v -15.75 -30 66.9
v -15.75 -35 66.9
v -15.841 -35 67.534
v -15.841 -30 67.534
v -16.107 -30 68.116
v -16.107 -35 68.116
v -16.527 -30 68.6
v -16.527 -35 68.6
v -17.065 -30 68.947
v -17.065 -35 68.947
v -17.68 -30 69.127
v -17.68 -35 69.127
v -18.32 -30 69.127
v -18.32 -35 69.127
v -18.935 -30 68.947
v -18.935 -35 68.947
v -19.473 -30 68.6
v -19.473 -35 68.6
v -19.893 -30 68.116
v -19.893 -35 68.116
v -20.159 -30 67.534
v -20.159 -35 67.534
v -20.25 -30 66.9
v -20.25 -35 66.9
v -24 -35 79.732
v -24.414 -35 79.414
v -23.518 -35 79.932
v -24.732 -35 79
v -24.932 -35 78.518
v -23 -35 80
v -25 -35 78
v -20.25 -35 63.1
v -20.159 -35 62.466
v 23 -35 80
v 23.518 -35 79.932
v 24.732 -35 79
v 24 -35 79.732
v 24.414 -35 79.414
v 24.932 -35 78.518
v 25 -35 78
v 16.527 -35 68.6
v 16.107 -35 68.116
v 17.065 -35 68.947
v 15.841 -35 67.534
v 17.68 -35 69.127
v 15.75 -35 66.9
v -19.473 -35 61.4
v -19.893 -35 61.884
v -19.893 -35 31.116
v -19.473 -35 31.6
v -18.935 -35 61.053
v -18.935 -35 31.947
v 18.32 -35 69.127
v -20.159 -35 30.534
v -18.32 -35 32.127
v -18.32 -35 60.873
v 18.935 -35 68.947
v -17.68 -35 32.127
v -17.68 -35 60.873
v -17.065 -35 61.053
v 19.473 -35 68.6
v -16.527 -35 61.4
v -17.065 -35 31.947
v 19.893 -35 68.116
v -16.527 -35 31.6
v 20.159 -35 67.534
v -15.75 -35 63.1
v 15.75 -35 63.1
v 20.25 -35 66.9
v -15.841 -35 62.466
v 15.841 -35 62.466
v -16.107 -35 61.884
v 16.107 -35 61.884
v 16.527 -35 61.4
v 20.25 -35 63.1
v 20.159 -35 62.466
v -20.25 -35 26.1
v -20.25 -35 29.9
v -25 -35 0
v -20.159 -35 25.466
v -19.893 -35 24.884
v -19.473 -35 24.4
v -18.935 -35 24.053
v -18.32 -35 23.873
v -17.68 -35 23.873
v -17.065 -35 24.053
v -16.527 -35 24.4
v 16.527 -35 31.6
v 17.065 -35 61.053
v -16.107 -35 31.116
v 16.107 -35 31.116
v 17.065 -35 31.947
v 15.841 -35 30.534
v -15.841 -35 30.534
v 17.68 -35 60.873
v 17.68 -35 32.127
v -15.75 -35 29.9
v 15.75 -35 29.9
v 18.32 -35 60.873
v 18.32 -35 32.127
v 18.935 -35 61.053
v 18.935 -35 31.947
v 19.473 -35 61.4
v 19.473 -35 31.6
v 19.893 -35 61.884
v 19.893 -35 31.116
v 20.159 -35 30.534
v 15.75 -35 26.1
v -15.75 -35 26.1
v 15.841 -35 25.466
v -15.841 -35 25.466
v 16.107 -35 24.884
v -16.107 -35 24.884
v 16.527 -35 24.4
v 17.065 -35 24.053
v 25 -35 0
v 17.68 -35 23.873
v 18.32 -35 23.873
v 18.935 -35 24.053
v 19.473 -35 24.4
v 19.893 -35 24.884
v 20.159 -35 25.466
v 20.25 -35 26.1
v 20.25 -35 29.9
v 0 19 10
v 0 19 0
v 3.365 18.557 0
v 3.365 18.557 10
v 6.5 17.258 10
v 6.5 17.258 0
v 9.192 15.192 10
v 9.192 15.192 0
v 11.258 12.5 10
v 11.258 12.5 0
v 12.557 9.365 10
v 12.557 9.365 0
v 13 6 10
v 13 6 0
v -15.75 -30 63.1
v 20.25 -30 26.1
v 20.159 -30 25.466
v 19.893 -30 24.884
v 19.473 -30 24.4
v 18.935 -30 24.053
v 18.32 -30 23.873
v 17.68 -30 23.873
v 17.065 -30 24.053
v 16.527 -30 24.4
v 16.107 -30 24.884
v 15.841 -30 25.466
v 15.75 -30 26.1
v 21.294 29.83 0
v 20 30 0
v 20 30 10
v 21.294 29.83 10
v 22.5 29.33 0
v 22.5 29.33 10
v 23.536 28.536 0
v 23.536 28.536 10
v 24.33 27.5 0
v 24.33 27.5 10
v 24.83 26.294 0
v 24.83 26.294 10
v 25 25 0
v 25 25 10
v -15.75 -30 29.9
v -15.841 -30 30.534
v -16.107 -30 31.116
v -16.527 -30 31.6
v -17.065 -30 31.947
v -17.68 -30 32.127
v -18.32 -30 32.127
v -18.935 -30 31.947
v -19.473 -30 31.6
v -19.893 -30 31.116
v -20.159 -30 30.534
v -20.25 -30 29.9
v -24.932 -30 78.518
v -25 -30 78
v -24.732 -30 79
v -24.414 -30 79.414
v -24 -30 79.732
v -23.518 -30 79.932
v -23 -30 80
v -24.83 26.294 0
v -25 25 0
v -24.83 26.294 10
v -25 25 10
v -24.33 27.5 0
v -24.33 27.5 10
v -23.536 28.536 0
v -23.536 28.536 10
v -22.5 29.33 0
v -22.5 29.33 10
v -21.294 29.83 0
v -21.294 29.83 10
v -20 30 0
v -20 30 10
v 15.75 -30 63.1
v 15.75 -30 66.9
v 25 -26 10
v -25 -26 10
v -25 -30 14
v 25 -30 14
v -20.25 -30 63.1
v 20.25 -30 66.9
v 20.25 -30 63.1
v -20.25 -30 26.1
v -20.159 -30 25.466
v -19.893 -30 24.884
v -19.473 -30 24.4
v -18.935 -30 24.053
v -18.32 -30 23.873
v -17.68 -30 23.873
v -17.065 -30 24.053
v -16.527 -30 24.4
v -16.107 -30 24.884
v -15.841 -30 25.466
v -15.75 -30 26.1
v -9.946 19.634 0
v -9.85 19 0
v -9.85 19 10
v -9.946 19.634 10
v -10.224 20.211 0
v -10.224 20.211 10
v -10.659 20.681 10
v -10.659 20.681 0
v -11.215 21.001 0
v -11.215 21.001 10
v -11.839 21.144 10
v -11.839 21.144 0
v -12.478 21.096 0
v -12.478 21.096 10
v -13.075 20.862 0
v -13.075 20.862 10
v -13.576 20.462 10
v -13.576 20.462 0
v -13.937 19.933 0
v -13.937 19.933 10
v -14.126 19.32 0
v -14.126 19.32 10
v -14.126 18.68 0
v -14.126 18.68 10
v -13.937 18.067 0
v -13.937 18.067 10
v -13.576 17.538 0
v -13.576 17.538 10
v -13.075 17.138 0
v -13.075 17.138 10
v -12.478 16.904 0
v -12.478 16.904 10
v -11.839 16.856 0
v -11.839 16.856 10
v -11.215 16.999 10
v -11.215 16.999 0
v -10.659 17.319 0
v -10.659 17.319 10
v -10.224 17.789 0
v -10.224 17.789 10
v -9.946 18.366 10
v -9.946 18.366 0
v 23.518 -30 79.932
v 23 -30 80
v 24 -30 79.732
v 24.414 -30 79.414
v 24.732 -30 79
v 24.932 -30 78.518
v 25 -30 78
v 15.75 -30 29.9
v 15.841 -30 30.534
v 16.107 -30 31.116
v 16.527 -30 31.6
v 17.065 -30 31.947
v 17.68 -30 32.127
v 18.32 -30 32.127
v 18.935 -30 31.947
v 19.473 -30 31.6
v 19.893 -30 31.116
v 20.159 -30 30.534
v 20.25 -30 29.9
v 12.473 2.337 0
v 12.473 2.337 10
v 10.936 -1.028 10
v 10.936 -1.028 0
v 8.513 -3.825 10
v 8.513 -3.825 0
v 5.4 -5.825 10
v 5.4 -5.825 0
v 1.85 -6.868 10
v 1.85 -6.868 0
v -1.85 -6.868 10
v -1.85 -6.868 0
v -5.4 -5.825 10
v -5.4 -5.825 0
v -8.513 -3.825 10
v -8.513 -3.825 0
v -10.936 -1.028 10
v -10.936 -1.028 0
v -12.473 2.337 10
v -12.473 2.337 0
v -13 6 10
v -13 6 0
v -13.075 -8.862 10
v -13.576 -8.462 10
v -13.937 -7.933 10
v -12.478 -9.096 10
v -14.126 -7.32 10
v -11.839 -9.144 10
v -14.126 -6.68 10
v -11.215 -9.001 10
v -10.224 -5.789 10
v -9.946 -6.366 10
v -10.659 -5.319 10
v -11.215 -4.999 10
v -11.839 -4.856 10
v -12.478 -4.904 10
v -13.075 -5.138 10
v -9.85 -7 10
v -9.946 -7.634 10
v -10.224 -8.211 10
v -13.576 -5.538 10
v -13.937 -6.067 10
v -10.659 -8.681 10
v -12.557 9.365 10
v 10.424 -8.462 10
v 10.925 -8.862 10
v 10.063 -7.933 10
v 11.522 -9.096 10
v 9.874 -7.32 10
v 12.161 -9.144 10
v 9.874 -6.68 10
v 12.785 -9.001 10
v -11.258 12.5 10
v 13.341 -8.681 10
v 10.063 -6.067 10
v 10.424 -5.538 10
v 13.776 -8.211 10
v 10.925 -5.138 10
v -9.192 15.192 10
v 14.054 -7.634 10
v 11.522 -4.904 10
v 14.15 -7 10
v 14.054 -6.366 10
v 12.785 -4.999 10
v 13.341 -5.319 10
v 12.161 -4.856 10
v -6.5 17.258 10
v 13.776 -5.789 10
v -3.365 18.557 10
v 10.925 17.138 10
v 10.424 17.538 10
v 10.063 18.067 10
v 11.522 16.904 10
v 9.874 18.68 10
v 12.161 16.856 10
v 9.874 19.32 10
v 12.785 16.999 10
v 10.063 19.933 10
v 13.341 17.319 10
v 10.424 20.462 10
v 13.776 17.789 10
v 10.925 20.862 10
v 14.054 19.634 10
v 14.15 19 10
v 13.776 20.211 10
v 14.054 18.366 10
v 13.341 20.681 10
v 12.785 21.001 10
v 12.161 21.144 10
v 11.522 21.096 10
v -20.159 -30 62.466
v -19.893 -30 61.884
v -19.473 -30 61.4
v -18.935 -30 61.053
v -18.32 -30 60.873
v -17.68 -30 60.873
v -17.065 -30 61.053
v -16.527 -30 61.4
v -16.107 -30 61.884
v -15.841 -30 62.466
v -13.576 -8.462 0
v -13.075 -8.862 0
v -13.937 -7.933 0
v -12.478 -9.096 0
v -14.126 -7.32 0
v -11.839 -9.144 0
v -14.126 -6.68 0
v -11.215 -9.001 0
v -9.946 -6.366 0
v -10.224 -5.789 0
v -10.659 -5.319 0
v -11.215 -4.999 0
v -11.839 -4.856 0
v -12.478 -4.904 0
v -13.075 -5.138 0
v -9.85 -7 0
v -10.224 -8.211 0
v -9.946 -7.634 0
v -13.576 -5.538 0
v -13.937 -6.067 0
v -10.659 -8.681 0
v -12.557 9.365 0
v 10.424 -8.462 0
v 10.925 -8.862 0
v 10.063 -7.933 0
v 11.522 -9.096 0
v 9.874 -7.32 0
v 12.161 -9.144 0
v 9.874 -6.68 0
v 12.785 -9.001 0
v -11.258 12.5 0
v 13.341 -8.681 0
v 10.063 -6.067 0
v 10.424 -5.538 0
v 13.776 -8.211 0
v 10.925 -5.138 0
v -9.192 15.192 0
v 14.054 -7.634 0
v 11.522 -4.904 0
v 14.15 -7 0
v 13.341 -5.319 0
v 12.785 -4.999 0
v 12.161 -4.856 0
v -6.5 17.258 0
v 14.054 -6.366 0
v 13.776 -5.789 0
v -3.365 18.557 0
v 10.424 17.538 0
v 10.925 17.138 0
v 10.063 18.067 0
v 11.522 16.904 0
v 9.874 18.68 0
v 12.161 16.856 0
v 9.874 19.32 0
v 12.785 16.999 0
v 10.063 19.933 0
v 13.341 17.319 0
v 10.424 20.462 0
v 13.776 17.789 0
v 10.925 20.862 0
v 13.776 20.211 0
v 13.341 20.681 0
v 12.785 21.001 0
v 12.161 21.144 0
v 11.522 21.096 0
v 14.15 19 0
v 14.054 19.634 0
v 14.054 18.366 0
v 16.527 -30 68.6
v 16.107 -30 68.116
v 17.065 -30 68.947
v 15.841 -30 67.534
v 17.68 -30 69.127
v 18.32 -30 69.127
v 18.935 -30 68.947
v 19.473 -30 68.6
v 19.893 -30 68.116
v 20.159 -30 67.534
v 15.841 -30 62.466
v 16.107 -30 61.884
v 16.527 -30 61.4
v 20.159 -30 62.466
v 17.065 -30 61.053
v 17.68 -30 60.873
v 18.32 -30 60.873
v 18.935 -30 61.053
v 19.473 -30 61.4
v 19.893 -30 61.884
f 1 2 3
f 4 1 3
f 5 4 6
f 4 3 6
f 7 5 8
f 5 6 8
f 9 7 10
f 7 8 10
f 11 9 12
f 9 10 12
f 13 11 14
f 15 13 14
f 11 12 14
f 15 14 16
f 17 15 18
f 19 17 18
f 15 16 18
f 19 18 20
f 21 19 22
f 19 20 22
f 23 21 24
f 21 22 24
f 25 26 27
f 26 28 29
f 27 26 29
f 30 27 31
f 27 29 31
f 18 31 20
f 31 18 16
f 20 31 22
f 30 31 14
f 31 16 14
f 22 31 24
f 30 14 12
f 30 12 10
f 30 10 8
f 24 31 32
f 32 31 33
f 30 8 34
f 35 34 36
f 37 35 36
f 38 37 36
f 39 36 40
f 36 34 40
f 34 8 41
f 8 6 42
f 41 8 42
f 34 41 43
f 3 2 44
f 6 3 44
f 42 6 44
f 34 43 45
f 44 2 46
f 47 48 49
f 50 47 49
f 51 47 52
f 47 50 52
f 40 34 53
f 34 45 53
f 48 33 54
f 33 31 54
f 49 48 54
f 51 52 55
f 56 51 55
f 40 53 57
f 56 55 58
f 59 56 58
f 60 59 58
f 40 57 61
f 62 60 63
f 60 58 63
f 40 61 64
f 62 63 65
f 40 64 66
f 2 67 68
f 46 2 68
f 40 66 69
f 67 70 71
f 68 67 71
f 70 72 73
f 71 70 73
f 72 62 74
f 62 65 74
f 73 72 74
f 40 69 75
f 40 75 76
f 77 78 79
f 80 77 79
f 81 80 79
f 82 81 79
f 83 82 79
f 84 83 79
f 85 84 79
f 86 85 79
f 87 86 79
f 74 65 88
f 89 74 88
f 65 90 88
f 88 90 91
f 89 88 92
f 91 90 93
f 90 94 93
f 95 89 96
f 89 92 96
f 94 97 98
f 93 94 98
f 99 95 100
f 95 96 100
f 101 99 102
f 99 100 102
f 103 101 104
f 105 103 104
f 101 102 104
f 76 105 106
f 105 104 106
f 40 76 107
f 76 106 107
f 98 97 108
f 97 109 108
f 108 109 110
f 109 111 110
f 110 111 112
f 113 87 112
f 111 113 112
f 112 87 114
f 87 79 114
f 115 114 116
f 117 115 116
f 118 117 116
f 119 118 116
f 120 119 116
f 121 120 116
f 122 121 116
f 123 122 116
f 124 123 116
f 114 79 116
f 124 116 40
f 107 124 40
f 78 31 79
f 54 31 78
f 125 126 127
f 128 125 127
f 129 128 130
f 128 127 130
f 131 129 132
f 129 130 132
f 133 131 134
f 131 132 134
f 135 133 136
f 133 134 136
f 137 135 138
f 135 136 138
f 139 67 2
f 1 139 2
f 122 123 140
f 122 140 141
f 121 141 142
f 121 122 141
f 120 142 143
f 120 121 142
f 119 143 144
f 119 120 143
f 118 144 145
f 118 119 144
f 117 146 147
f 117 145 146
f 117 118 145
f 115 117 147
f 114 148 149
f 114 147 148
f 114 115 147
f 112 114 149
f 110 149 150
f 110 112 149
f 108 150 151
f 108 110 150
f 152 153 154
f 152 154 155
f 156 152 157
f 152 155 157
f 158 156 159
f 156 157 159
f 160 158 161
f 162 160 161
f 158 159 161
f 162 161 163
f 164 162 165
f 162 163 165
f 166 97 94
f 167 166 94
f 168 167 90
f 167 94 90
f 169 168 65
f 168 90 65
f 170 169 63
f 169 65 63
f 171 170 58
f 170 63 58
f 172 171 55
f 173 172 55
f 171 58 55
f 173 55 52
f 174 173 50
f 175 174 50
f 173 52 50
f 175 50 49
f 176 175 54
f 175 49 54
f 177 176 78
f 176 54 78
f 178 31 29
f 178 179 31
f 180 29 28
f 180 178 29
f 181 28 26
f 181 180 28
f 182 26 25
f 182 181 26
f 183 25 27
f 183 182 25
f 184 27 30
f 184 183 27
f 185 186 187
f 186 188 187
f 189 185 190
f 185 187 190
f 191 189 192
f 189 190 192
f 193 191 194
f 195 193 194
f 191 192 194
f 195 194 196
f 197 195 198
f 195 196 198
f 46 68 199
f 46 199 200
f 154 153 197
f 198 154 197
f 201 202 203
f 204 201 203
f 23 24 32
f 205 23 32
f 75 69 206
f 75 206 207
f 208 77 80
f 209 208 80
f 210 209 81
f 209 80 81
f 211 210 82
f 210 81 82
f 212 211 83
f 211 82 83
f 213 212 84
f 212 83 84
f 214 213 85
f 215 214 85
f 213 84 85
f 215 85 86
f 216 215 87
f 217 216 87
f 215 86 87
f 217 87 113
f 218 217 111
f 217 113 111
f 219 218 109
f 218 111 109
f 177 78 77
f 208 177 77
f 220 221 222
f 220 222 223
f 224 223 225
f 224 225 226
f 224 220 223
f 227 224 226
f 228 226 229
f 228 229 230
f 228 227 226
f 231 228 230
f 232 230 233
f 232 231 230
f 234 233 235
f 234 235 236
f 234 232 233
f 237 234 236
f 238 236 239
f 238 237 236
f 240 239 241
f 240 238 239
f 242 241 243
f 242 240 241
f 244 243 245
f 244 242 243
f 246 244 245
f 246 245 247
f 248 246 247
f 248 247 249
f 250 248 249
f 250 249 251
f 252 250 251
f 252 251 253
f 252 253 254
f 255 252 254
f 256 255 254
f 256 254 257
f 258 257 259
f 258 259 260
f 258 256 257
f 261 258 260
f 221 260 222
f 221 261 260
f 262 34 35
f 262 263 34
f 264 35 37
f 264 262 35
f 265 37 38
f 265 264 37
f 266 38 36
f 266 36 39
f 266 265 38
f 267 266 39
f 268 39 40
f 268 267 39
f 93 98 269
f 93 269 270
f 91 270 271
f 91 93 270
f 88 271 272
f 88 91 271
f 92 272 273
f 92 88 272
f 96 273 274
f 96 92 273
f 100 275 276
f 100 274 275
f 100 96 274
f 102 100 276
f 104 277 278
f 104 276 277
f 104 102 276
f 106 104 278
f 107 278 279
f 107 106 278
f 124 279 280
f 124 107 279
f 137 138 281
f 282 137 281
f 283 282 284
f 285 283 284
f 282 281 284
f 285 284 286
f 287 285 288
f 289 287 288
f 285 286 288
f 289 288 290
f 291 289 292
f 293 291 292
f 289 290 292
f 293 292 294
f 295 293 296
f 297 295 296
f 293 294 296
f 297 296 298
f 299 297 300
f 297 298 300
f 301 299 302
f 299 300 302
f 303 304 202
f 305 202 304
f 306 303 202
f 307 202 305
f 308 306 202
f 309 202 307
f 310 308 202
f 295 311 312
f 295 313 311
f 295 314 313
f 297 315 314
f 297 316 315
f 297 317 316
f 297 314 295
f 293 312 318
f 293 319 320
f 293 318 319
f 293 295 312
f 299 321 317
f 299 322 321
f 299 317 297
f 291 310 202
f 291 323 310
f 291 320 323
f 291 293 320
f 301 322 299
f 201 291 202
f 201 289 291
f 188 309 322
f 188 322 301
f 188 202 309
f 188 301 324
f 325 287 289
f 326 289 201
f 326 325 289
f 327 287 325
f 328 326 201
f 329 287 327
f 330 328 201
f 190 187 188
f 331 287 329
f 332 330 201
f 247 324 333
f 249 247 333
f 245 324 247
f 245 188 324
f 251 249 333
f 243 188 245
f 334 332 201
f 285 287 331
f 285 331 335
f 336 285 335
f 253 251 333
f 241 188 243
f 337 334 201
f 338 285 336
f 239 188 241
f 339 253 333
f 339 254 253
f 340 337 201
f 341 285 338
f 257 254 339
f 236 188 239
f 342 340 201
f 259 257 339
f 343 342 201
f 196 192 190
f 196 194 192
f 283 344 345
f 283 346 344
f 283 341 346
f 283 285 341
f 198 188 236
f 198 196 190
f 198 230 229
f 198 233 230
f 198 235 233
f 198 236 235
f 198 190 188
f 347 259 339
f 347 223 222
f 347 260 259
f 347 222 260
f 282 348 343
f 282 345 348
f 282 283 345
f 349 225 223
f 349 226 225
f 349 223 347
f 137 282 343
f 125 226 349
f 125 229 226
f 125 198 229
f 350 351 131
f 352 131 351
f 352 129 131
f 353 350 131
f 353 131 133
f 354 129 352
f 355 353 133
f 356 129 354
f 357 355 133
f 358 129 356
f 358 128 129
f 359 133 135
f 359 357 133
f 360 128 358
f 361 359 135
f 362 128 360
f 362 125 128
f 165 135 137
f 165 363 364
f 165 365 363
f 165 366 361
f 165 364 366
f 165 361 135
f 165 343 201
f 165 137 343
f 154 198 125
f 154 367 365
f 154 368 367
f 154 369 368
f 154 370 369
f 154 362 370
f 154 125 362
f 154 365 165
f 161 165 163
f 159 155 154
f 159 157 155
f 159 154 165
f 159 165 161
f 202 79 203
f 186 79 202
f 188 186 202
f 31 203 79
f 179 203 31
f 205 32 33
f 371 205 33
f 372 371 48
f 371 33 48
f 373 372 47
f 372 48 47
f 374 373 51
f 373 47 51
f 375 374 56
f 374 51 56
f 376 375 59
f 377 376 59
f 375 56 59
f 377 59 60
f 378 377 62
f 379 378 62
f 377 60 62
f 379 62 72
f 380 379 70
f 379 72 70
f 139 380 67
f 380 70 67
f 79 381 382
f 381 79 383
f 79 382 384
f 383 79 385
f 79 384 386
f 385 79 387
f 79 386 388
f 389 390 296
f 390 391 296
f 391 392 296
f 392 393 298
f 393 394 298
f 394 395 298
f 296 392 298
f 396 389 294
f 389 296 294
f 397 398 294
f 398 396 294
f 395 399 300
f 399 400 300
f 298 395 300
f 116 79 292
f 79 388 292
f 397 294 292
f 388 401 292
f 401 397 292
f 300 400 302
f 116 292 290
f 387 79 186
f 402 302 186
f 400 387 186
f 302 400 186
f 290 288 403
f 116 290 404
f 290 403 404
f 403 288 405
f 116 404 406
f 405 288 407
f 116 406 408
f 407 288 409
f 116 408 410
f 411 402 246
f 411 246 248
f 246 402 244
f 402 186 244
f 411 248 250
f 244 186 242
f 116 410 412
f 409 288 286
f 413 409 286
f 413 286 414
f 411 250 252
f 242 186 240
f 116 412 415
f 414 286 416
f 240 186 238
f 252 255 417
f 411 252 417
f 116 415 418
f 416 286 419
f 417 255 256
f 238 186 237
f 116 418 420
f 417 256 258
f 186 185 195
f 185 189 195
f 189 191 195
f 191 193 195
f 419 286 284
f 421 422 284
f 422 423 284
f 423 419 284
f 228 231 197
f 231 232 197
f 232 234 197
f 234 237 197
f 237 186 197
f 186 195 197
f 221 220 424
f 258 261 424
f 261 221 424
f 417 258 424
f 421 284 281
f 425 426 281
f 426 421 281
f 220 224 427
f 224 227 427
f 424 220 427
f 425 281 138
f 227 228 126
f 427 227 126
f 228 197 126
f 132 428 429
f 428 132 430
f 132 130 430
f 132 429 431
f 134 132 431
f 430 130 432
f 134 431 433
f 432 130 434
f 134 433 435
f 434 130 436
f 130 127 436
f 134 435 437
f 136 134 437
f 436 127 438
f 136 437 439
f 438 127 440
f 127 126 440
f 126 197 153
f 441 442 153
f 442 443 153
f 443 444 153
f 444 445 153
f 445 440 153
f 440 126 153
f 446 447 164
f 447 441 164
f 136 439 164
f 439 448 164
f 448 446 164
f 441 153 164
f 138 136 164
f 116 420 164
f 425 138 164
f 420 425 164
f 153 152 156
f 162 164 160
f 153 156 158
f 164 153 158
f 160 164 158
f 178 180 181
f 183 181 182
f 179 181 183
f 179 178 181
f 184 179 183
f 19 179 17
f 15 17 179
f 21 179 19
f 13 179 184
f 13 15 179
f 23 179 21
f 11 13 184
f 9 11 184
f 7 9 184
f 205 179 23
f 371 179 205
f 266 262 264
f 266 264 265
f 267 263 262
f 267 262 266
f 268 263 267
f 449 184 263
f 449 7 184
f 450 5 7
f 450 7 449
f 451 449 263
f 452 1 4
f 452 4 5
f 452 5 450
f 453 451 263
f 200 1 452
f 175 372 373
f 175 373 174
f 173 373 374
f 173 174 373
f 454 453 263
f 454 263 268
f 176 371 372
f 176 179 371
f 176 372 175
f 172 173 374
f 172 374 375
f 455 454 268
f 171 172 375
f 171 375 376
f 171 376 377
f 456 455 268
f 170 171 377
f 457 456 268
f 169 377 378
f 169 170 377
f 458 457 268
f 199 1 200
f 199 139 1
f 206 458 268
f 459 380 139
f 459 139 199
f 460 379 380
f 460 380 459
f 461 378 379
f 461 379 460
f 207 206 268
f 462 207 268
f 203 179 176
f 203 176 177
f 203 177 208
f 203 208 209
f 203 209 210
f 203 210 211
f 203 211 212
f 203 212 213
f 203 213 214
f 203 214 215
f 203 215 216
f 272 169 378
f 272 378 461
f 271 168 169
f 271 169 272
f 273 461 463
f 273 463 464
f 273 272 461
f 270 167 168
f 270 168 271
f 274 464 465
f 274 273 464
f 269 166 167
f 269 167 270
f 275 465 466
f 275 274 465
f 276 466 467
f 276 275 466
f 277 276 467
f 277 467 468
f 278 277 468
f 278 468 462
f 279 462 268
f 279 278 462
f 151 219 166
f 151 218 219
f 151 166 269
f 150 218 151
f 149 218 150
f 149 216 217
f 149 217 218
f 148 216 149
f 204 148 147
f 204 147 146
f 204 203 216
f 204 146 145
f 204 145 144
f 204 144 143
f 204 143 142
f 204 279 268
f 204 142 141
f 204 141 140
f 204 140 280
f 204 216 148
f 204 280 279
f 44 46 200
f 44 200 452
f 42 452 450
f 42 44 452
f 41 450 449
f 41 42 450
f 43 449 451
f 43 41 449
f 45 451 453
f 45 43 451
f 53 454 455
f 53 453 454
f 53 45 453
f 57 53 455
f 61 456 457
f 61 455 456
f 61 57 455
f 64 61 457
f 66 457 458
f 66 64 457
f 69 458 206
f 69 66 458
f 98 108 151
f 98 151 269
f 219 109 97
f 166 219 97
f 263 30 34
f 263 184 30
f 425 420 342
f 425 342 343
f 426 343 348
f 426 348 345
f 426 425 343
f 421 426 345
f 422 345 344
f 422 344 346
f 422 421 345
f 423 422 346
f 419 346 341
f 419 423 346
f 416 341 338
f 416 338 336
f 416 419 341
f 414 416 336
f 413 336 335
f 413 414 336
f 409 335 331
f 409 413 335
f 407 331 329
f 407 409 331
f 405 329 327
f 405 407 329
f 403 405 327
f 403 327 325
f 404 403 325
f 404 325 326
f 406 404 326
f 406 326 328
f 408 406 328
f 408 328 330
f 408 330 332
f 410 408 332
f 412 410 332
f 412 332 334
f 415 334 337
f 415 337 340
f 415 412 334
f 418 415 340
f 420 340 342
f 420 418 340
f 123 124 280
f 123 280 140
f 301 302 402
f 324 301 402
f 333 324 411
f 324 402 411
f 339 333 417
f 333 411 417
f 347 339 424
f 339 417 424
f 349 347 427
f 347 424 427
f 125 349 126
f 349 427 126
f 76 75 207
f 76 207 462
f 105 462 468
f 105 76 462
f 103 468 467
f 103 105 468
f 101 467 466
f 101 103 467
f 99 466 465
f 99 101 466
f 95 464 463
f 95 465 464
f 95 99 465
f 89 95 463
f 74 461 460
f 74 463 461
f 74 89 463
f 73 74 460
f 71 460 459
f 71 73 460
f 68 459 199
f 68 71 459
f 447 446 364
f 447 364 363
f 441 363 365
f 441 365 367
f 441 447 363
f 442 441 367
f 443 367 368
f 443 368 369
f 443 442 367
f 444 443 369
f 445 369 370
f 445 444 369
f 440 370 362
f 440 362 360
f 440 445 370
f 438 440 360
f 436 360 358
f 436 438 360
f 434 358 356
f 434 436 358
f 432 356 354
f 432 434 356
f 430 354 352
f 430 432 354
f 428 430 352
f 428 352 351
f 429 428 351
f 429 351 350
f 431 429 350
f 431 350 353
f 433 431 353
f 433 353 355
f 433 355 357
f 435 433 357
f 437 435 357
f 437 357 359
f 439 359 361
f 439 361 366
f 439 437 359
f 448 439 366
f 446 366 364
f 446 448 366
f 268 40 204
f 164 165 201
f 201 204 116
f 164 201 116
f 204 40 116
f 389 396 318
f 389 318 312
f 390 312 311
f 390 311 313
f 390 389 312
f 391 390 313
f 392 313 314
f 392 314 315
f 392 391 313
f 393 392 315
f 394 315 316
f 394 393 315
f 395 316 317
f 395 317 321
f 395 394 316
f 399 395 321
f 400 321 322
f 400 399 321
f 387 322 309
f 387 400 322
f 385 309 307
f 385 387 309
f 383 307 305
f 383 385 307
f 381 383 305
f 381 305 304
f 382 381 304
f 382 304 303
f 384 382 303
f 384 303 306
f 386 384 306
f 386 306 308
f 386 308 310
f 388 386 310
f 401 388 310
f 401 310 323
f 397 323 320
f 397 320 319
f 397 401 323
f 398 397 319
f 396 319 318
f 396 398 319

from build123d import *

# Parameters (mm, degrees)
SKETCH_1_R               = 2.15
EXTRUDE_1_DEPTH          = 10
SKETCH_2_W               = 50
SKETCH_2_H               = 10
EXTRUDE_2_DEPTH          = 5
SKETCH_3_W               = 50
SKETCH_3_H               = 5
EXTRUDE_3_DEPTH          = 70
CUT_EXTRUDE_1_DEPTH      = 104.07764064
CUT_EXTRUDE_1_DEPTH_BACK = 20
FILLET_1_R               = 5
FILLET_2_R               = 2
SKETCH_9_W               = 4
SKETCH_9_H               = 4
EXTRUDE_4_DEPTH          = 4
SKETCH_13_W              = 4
SKETCH_13_H              = 4
EXTRUDE_6_DEPTH          = 46
CUT_EXTRUDE_2_DEPTH      = 101.623058987


with BuildPart() as part:
    # 草图1 → 凸台-拉伸1 (new body)
    # profile 1 of 3: a face of its own
    with BuildSketch(Plane.XY):
        with BuildLine():
            Line((13, 6), (25, 6))
            Line((25, 6), (25, 30))
            Line((25, 30), (0, 30))
            Line((0, 30), (0, 19))
            ThreePointArc((0, 19), (9.192388155, 15.192388155), (13, 6))
        make_face()
        with Locations((12, 19)):
            Circle(SKETCH_1_R, mode=Mode.SUBTRACT)
    # profile 2 of 3: a face of its own
    with BuildSketch(Plane.XY):
        with BuildLine():
            Line((-25, 19), (-25, 6))
            Line((-25, 6), (-13, 6))
            ThreePointArc((-13, 6), (-9.192388155, 15.192388155), (0, 19))
            Line((0, 19), (0, 30))
            Line((0, 30), (-25, 30))
            Line((-25, 30), (-25, 19))
        make_face()
        with Locations((-12, 19)):
            Circle(SKETCH_1_R, mode=Mode.SUBTRACT)
    # profile 3 of 3: a face of its own
    with BuildSketch(Plane.XY):
        with BuildLine():
            Line((-25, -30), (25, -30))
            Line((25, -30), (25, -27))
            Line((25, -27), (25, -7))
            Line((25, -7), (25, 6))
            Line((25, 6), (13, 6))
            ThreePointArc((13, 6), (0, -7), (-13, 6))
            Line((-13, 6), (-25, 6))
            Line((-25, 6), (-25, -30))
        make_face()
        with Locations((-12, -7)):
            Circle(SKETCH_1_R, mode=Mode.SUBTRACT)
        with Locations((12, -7)):
            Circle(SKETCH_1_R, mode=Mode.SUBTRACT)
    extrude(amount=EXTRUDE_1_DEPTH)

    # 草图2 → 凸台-拉伸2 (add)
    with BuildSketch(Plane.XZ.offset(30)):
        with Locations((0, 5)):
            Rectangle(SKETCH_2_W, SKETCH_2_H)
    extrude(amount=EXTRUDE_2_DEPTH)

    # 草图3 → 凸台-拉伸3 (add)
    with BuildSketch(Plane.XY.offset(10)):
        with Locations((0, -32.5)):
            Rectangle(SKETCH_3_W, SKETCH_3_H)
    extrude(amount=EXTRUDE_3_DEPTH)

    # 草图8 → 切除-拉伸1 (cut, two sides: drawn at the far end of the back side and taken through both)
    with BuildSketch(Plane(origin=(0, -30, 0), x_dir=(1, 0, 0), z_dir=(0, 1, 0)).offset(-CUT_EXTRUDE_1_DEPTH_BACK)):
        with BuildLine():
            Line((-20.25, -66.9), (-20.25, -63.1))
            ThreePointArc((-20.25, -63.1), (-18, -60.85), (-15.75, -63.1))
            Line((-15.75, -63.1), (-15.75, -66.9))
            ThreePointArc((-15.75, -66.9), (-18, -69.15), (-20.25, -66.9))
        make_face()
        with BuildLine():
            Line((-15.75, -26.1), (-15.75, -29.9))
            ThreePointArc((-15.75, -29.9), (-18, -32.15), (-20.25, -29.9))
            Line((-20.25, -29.9), (-20.25, -26.1))
            ThreePointArc((-20.25, -26.1), (-18, -23.85), (-15.75, -26.1))
        make_face()
        with BuildLine():
            Line((20.25, -66.9), (20.25, -63.1))
            ThreePointArc((20.25, -63.1), (18, -60.85), (15.75, -63.1))
            Line((15.75, -63.1), (15.75, -66.9))
            ThreePointArc((15.75, -66.9), (18, -69.15), (20.25, -66.9))
        make_face()
        with BuildLine():
            Line((15.75, -26.1), (15.75, -29.9))
            ThreePointArc((15.75, -29.9), (18, -32.15), (20.25, -29.9))
            Line((20.25, -29.9), (20.25, -26.1))
            ThreePointArc((20.25, -26.1), (18, -23.85), (15.75, -26.1))
        make_face()
    extrude(amount=CUT_EXTRUDE_1_DEPTH + CUT_EXTRUDE_1_DEPTH_BACK, mode=Mode.SUBTRACT)

    # 圆角1
    fillet_1_edges = [part.edges().sort_by_distance(p)[0] for p in [
        (-25, 30, 5),
        (25, 30, 5),
    ]]
    fillet(fillet_1_edges, radius=FILLET_1_R)

    # 圆角2
    fillet_2_edges = [part.edges().sort_by_distance(p)[0] for p in [
        (25, -32.5, 80),
        (-25, -32.5, 80),
    ]]
    fillet(fillet_2_edges, radius=FILLET_2_R)

    # 草图9 → 凸台-拉伸4 (add)
    with BuildSketch(Plane(origin=(0, -30, 0), x_dir=(1, 0, 0), z_dir=(0, 1, 0))):
        with Locations((23, -12)):
            Rectangle(SKETCH_9_W, SKETCH_9_H)
    extrude(amount=EXTRUDE_4_DEPTH)

    # 草图13 → 凸台-拉伸6 (add)
    with BuildSketch(Plane.ZY.offset(-21)):
        with Locations((12, -28)):
            Rectangle(SKETCH_13_W, SKETCH_13_H)
    extrude(amount=EXTRUDE_6_DEPTH)

    # 草图14 → 切除-拉伸2 (cut, through all)
    with BuildSketch(Plane(origin=(25, 0, 0), x_dir=(0, 0, -1), z_dir=(1, 0, 0))):
        Polygon((-10, -26), (-14, -30), (-14, -26), align=None)
    extrude(amount=-CUT_EXTRUDE_2_DEPTH, mode=Mode.SUBTRACT)


solid = part.part
